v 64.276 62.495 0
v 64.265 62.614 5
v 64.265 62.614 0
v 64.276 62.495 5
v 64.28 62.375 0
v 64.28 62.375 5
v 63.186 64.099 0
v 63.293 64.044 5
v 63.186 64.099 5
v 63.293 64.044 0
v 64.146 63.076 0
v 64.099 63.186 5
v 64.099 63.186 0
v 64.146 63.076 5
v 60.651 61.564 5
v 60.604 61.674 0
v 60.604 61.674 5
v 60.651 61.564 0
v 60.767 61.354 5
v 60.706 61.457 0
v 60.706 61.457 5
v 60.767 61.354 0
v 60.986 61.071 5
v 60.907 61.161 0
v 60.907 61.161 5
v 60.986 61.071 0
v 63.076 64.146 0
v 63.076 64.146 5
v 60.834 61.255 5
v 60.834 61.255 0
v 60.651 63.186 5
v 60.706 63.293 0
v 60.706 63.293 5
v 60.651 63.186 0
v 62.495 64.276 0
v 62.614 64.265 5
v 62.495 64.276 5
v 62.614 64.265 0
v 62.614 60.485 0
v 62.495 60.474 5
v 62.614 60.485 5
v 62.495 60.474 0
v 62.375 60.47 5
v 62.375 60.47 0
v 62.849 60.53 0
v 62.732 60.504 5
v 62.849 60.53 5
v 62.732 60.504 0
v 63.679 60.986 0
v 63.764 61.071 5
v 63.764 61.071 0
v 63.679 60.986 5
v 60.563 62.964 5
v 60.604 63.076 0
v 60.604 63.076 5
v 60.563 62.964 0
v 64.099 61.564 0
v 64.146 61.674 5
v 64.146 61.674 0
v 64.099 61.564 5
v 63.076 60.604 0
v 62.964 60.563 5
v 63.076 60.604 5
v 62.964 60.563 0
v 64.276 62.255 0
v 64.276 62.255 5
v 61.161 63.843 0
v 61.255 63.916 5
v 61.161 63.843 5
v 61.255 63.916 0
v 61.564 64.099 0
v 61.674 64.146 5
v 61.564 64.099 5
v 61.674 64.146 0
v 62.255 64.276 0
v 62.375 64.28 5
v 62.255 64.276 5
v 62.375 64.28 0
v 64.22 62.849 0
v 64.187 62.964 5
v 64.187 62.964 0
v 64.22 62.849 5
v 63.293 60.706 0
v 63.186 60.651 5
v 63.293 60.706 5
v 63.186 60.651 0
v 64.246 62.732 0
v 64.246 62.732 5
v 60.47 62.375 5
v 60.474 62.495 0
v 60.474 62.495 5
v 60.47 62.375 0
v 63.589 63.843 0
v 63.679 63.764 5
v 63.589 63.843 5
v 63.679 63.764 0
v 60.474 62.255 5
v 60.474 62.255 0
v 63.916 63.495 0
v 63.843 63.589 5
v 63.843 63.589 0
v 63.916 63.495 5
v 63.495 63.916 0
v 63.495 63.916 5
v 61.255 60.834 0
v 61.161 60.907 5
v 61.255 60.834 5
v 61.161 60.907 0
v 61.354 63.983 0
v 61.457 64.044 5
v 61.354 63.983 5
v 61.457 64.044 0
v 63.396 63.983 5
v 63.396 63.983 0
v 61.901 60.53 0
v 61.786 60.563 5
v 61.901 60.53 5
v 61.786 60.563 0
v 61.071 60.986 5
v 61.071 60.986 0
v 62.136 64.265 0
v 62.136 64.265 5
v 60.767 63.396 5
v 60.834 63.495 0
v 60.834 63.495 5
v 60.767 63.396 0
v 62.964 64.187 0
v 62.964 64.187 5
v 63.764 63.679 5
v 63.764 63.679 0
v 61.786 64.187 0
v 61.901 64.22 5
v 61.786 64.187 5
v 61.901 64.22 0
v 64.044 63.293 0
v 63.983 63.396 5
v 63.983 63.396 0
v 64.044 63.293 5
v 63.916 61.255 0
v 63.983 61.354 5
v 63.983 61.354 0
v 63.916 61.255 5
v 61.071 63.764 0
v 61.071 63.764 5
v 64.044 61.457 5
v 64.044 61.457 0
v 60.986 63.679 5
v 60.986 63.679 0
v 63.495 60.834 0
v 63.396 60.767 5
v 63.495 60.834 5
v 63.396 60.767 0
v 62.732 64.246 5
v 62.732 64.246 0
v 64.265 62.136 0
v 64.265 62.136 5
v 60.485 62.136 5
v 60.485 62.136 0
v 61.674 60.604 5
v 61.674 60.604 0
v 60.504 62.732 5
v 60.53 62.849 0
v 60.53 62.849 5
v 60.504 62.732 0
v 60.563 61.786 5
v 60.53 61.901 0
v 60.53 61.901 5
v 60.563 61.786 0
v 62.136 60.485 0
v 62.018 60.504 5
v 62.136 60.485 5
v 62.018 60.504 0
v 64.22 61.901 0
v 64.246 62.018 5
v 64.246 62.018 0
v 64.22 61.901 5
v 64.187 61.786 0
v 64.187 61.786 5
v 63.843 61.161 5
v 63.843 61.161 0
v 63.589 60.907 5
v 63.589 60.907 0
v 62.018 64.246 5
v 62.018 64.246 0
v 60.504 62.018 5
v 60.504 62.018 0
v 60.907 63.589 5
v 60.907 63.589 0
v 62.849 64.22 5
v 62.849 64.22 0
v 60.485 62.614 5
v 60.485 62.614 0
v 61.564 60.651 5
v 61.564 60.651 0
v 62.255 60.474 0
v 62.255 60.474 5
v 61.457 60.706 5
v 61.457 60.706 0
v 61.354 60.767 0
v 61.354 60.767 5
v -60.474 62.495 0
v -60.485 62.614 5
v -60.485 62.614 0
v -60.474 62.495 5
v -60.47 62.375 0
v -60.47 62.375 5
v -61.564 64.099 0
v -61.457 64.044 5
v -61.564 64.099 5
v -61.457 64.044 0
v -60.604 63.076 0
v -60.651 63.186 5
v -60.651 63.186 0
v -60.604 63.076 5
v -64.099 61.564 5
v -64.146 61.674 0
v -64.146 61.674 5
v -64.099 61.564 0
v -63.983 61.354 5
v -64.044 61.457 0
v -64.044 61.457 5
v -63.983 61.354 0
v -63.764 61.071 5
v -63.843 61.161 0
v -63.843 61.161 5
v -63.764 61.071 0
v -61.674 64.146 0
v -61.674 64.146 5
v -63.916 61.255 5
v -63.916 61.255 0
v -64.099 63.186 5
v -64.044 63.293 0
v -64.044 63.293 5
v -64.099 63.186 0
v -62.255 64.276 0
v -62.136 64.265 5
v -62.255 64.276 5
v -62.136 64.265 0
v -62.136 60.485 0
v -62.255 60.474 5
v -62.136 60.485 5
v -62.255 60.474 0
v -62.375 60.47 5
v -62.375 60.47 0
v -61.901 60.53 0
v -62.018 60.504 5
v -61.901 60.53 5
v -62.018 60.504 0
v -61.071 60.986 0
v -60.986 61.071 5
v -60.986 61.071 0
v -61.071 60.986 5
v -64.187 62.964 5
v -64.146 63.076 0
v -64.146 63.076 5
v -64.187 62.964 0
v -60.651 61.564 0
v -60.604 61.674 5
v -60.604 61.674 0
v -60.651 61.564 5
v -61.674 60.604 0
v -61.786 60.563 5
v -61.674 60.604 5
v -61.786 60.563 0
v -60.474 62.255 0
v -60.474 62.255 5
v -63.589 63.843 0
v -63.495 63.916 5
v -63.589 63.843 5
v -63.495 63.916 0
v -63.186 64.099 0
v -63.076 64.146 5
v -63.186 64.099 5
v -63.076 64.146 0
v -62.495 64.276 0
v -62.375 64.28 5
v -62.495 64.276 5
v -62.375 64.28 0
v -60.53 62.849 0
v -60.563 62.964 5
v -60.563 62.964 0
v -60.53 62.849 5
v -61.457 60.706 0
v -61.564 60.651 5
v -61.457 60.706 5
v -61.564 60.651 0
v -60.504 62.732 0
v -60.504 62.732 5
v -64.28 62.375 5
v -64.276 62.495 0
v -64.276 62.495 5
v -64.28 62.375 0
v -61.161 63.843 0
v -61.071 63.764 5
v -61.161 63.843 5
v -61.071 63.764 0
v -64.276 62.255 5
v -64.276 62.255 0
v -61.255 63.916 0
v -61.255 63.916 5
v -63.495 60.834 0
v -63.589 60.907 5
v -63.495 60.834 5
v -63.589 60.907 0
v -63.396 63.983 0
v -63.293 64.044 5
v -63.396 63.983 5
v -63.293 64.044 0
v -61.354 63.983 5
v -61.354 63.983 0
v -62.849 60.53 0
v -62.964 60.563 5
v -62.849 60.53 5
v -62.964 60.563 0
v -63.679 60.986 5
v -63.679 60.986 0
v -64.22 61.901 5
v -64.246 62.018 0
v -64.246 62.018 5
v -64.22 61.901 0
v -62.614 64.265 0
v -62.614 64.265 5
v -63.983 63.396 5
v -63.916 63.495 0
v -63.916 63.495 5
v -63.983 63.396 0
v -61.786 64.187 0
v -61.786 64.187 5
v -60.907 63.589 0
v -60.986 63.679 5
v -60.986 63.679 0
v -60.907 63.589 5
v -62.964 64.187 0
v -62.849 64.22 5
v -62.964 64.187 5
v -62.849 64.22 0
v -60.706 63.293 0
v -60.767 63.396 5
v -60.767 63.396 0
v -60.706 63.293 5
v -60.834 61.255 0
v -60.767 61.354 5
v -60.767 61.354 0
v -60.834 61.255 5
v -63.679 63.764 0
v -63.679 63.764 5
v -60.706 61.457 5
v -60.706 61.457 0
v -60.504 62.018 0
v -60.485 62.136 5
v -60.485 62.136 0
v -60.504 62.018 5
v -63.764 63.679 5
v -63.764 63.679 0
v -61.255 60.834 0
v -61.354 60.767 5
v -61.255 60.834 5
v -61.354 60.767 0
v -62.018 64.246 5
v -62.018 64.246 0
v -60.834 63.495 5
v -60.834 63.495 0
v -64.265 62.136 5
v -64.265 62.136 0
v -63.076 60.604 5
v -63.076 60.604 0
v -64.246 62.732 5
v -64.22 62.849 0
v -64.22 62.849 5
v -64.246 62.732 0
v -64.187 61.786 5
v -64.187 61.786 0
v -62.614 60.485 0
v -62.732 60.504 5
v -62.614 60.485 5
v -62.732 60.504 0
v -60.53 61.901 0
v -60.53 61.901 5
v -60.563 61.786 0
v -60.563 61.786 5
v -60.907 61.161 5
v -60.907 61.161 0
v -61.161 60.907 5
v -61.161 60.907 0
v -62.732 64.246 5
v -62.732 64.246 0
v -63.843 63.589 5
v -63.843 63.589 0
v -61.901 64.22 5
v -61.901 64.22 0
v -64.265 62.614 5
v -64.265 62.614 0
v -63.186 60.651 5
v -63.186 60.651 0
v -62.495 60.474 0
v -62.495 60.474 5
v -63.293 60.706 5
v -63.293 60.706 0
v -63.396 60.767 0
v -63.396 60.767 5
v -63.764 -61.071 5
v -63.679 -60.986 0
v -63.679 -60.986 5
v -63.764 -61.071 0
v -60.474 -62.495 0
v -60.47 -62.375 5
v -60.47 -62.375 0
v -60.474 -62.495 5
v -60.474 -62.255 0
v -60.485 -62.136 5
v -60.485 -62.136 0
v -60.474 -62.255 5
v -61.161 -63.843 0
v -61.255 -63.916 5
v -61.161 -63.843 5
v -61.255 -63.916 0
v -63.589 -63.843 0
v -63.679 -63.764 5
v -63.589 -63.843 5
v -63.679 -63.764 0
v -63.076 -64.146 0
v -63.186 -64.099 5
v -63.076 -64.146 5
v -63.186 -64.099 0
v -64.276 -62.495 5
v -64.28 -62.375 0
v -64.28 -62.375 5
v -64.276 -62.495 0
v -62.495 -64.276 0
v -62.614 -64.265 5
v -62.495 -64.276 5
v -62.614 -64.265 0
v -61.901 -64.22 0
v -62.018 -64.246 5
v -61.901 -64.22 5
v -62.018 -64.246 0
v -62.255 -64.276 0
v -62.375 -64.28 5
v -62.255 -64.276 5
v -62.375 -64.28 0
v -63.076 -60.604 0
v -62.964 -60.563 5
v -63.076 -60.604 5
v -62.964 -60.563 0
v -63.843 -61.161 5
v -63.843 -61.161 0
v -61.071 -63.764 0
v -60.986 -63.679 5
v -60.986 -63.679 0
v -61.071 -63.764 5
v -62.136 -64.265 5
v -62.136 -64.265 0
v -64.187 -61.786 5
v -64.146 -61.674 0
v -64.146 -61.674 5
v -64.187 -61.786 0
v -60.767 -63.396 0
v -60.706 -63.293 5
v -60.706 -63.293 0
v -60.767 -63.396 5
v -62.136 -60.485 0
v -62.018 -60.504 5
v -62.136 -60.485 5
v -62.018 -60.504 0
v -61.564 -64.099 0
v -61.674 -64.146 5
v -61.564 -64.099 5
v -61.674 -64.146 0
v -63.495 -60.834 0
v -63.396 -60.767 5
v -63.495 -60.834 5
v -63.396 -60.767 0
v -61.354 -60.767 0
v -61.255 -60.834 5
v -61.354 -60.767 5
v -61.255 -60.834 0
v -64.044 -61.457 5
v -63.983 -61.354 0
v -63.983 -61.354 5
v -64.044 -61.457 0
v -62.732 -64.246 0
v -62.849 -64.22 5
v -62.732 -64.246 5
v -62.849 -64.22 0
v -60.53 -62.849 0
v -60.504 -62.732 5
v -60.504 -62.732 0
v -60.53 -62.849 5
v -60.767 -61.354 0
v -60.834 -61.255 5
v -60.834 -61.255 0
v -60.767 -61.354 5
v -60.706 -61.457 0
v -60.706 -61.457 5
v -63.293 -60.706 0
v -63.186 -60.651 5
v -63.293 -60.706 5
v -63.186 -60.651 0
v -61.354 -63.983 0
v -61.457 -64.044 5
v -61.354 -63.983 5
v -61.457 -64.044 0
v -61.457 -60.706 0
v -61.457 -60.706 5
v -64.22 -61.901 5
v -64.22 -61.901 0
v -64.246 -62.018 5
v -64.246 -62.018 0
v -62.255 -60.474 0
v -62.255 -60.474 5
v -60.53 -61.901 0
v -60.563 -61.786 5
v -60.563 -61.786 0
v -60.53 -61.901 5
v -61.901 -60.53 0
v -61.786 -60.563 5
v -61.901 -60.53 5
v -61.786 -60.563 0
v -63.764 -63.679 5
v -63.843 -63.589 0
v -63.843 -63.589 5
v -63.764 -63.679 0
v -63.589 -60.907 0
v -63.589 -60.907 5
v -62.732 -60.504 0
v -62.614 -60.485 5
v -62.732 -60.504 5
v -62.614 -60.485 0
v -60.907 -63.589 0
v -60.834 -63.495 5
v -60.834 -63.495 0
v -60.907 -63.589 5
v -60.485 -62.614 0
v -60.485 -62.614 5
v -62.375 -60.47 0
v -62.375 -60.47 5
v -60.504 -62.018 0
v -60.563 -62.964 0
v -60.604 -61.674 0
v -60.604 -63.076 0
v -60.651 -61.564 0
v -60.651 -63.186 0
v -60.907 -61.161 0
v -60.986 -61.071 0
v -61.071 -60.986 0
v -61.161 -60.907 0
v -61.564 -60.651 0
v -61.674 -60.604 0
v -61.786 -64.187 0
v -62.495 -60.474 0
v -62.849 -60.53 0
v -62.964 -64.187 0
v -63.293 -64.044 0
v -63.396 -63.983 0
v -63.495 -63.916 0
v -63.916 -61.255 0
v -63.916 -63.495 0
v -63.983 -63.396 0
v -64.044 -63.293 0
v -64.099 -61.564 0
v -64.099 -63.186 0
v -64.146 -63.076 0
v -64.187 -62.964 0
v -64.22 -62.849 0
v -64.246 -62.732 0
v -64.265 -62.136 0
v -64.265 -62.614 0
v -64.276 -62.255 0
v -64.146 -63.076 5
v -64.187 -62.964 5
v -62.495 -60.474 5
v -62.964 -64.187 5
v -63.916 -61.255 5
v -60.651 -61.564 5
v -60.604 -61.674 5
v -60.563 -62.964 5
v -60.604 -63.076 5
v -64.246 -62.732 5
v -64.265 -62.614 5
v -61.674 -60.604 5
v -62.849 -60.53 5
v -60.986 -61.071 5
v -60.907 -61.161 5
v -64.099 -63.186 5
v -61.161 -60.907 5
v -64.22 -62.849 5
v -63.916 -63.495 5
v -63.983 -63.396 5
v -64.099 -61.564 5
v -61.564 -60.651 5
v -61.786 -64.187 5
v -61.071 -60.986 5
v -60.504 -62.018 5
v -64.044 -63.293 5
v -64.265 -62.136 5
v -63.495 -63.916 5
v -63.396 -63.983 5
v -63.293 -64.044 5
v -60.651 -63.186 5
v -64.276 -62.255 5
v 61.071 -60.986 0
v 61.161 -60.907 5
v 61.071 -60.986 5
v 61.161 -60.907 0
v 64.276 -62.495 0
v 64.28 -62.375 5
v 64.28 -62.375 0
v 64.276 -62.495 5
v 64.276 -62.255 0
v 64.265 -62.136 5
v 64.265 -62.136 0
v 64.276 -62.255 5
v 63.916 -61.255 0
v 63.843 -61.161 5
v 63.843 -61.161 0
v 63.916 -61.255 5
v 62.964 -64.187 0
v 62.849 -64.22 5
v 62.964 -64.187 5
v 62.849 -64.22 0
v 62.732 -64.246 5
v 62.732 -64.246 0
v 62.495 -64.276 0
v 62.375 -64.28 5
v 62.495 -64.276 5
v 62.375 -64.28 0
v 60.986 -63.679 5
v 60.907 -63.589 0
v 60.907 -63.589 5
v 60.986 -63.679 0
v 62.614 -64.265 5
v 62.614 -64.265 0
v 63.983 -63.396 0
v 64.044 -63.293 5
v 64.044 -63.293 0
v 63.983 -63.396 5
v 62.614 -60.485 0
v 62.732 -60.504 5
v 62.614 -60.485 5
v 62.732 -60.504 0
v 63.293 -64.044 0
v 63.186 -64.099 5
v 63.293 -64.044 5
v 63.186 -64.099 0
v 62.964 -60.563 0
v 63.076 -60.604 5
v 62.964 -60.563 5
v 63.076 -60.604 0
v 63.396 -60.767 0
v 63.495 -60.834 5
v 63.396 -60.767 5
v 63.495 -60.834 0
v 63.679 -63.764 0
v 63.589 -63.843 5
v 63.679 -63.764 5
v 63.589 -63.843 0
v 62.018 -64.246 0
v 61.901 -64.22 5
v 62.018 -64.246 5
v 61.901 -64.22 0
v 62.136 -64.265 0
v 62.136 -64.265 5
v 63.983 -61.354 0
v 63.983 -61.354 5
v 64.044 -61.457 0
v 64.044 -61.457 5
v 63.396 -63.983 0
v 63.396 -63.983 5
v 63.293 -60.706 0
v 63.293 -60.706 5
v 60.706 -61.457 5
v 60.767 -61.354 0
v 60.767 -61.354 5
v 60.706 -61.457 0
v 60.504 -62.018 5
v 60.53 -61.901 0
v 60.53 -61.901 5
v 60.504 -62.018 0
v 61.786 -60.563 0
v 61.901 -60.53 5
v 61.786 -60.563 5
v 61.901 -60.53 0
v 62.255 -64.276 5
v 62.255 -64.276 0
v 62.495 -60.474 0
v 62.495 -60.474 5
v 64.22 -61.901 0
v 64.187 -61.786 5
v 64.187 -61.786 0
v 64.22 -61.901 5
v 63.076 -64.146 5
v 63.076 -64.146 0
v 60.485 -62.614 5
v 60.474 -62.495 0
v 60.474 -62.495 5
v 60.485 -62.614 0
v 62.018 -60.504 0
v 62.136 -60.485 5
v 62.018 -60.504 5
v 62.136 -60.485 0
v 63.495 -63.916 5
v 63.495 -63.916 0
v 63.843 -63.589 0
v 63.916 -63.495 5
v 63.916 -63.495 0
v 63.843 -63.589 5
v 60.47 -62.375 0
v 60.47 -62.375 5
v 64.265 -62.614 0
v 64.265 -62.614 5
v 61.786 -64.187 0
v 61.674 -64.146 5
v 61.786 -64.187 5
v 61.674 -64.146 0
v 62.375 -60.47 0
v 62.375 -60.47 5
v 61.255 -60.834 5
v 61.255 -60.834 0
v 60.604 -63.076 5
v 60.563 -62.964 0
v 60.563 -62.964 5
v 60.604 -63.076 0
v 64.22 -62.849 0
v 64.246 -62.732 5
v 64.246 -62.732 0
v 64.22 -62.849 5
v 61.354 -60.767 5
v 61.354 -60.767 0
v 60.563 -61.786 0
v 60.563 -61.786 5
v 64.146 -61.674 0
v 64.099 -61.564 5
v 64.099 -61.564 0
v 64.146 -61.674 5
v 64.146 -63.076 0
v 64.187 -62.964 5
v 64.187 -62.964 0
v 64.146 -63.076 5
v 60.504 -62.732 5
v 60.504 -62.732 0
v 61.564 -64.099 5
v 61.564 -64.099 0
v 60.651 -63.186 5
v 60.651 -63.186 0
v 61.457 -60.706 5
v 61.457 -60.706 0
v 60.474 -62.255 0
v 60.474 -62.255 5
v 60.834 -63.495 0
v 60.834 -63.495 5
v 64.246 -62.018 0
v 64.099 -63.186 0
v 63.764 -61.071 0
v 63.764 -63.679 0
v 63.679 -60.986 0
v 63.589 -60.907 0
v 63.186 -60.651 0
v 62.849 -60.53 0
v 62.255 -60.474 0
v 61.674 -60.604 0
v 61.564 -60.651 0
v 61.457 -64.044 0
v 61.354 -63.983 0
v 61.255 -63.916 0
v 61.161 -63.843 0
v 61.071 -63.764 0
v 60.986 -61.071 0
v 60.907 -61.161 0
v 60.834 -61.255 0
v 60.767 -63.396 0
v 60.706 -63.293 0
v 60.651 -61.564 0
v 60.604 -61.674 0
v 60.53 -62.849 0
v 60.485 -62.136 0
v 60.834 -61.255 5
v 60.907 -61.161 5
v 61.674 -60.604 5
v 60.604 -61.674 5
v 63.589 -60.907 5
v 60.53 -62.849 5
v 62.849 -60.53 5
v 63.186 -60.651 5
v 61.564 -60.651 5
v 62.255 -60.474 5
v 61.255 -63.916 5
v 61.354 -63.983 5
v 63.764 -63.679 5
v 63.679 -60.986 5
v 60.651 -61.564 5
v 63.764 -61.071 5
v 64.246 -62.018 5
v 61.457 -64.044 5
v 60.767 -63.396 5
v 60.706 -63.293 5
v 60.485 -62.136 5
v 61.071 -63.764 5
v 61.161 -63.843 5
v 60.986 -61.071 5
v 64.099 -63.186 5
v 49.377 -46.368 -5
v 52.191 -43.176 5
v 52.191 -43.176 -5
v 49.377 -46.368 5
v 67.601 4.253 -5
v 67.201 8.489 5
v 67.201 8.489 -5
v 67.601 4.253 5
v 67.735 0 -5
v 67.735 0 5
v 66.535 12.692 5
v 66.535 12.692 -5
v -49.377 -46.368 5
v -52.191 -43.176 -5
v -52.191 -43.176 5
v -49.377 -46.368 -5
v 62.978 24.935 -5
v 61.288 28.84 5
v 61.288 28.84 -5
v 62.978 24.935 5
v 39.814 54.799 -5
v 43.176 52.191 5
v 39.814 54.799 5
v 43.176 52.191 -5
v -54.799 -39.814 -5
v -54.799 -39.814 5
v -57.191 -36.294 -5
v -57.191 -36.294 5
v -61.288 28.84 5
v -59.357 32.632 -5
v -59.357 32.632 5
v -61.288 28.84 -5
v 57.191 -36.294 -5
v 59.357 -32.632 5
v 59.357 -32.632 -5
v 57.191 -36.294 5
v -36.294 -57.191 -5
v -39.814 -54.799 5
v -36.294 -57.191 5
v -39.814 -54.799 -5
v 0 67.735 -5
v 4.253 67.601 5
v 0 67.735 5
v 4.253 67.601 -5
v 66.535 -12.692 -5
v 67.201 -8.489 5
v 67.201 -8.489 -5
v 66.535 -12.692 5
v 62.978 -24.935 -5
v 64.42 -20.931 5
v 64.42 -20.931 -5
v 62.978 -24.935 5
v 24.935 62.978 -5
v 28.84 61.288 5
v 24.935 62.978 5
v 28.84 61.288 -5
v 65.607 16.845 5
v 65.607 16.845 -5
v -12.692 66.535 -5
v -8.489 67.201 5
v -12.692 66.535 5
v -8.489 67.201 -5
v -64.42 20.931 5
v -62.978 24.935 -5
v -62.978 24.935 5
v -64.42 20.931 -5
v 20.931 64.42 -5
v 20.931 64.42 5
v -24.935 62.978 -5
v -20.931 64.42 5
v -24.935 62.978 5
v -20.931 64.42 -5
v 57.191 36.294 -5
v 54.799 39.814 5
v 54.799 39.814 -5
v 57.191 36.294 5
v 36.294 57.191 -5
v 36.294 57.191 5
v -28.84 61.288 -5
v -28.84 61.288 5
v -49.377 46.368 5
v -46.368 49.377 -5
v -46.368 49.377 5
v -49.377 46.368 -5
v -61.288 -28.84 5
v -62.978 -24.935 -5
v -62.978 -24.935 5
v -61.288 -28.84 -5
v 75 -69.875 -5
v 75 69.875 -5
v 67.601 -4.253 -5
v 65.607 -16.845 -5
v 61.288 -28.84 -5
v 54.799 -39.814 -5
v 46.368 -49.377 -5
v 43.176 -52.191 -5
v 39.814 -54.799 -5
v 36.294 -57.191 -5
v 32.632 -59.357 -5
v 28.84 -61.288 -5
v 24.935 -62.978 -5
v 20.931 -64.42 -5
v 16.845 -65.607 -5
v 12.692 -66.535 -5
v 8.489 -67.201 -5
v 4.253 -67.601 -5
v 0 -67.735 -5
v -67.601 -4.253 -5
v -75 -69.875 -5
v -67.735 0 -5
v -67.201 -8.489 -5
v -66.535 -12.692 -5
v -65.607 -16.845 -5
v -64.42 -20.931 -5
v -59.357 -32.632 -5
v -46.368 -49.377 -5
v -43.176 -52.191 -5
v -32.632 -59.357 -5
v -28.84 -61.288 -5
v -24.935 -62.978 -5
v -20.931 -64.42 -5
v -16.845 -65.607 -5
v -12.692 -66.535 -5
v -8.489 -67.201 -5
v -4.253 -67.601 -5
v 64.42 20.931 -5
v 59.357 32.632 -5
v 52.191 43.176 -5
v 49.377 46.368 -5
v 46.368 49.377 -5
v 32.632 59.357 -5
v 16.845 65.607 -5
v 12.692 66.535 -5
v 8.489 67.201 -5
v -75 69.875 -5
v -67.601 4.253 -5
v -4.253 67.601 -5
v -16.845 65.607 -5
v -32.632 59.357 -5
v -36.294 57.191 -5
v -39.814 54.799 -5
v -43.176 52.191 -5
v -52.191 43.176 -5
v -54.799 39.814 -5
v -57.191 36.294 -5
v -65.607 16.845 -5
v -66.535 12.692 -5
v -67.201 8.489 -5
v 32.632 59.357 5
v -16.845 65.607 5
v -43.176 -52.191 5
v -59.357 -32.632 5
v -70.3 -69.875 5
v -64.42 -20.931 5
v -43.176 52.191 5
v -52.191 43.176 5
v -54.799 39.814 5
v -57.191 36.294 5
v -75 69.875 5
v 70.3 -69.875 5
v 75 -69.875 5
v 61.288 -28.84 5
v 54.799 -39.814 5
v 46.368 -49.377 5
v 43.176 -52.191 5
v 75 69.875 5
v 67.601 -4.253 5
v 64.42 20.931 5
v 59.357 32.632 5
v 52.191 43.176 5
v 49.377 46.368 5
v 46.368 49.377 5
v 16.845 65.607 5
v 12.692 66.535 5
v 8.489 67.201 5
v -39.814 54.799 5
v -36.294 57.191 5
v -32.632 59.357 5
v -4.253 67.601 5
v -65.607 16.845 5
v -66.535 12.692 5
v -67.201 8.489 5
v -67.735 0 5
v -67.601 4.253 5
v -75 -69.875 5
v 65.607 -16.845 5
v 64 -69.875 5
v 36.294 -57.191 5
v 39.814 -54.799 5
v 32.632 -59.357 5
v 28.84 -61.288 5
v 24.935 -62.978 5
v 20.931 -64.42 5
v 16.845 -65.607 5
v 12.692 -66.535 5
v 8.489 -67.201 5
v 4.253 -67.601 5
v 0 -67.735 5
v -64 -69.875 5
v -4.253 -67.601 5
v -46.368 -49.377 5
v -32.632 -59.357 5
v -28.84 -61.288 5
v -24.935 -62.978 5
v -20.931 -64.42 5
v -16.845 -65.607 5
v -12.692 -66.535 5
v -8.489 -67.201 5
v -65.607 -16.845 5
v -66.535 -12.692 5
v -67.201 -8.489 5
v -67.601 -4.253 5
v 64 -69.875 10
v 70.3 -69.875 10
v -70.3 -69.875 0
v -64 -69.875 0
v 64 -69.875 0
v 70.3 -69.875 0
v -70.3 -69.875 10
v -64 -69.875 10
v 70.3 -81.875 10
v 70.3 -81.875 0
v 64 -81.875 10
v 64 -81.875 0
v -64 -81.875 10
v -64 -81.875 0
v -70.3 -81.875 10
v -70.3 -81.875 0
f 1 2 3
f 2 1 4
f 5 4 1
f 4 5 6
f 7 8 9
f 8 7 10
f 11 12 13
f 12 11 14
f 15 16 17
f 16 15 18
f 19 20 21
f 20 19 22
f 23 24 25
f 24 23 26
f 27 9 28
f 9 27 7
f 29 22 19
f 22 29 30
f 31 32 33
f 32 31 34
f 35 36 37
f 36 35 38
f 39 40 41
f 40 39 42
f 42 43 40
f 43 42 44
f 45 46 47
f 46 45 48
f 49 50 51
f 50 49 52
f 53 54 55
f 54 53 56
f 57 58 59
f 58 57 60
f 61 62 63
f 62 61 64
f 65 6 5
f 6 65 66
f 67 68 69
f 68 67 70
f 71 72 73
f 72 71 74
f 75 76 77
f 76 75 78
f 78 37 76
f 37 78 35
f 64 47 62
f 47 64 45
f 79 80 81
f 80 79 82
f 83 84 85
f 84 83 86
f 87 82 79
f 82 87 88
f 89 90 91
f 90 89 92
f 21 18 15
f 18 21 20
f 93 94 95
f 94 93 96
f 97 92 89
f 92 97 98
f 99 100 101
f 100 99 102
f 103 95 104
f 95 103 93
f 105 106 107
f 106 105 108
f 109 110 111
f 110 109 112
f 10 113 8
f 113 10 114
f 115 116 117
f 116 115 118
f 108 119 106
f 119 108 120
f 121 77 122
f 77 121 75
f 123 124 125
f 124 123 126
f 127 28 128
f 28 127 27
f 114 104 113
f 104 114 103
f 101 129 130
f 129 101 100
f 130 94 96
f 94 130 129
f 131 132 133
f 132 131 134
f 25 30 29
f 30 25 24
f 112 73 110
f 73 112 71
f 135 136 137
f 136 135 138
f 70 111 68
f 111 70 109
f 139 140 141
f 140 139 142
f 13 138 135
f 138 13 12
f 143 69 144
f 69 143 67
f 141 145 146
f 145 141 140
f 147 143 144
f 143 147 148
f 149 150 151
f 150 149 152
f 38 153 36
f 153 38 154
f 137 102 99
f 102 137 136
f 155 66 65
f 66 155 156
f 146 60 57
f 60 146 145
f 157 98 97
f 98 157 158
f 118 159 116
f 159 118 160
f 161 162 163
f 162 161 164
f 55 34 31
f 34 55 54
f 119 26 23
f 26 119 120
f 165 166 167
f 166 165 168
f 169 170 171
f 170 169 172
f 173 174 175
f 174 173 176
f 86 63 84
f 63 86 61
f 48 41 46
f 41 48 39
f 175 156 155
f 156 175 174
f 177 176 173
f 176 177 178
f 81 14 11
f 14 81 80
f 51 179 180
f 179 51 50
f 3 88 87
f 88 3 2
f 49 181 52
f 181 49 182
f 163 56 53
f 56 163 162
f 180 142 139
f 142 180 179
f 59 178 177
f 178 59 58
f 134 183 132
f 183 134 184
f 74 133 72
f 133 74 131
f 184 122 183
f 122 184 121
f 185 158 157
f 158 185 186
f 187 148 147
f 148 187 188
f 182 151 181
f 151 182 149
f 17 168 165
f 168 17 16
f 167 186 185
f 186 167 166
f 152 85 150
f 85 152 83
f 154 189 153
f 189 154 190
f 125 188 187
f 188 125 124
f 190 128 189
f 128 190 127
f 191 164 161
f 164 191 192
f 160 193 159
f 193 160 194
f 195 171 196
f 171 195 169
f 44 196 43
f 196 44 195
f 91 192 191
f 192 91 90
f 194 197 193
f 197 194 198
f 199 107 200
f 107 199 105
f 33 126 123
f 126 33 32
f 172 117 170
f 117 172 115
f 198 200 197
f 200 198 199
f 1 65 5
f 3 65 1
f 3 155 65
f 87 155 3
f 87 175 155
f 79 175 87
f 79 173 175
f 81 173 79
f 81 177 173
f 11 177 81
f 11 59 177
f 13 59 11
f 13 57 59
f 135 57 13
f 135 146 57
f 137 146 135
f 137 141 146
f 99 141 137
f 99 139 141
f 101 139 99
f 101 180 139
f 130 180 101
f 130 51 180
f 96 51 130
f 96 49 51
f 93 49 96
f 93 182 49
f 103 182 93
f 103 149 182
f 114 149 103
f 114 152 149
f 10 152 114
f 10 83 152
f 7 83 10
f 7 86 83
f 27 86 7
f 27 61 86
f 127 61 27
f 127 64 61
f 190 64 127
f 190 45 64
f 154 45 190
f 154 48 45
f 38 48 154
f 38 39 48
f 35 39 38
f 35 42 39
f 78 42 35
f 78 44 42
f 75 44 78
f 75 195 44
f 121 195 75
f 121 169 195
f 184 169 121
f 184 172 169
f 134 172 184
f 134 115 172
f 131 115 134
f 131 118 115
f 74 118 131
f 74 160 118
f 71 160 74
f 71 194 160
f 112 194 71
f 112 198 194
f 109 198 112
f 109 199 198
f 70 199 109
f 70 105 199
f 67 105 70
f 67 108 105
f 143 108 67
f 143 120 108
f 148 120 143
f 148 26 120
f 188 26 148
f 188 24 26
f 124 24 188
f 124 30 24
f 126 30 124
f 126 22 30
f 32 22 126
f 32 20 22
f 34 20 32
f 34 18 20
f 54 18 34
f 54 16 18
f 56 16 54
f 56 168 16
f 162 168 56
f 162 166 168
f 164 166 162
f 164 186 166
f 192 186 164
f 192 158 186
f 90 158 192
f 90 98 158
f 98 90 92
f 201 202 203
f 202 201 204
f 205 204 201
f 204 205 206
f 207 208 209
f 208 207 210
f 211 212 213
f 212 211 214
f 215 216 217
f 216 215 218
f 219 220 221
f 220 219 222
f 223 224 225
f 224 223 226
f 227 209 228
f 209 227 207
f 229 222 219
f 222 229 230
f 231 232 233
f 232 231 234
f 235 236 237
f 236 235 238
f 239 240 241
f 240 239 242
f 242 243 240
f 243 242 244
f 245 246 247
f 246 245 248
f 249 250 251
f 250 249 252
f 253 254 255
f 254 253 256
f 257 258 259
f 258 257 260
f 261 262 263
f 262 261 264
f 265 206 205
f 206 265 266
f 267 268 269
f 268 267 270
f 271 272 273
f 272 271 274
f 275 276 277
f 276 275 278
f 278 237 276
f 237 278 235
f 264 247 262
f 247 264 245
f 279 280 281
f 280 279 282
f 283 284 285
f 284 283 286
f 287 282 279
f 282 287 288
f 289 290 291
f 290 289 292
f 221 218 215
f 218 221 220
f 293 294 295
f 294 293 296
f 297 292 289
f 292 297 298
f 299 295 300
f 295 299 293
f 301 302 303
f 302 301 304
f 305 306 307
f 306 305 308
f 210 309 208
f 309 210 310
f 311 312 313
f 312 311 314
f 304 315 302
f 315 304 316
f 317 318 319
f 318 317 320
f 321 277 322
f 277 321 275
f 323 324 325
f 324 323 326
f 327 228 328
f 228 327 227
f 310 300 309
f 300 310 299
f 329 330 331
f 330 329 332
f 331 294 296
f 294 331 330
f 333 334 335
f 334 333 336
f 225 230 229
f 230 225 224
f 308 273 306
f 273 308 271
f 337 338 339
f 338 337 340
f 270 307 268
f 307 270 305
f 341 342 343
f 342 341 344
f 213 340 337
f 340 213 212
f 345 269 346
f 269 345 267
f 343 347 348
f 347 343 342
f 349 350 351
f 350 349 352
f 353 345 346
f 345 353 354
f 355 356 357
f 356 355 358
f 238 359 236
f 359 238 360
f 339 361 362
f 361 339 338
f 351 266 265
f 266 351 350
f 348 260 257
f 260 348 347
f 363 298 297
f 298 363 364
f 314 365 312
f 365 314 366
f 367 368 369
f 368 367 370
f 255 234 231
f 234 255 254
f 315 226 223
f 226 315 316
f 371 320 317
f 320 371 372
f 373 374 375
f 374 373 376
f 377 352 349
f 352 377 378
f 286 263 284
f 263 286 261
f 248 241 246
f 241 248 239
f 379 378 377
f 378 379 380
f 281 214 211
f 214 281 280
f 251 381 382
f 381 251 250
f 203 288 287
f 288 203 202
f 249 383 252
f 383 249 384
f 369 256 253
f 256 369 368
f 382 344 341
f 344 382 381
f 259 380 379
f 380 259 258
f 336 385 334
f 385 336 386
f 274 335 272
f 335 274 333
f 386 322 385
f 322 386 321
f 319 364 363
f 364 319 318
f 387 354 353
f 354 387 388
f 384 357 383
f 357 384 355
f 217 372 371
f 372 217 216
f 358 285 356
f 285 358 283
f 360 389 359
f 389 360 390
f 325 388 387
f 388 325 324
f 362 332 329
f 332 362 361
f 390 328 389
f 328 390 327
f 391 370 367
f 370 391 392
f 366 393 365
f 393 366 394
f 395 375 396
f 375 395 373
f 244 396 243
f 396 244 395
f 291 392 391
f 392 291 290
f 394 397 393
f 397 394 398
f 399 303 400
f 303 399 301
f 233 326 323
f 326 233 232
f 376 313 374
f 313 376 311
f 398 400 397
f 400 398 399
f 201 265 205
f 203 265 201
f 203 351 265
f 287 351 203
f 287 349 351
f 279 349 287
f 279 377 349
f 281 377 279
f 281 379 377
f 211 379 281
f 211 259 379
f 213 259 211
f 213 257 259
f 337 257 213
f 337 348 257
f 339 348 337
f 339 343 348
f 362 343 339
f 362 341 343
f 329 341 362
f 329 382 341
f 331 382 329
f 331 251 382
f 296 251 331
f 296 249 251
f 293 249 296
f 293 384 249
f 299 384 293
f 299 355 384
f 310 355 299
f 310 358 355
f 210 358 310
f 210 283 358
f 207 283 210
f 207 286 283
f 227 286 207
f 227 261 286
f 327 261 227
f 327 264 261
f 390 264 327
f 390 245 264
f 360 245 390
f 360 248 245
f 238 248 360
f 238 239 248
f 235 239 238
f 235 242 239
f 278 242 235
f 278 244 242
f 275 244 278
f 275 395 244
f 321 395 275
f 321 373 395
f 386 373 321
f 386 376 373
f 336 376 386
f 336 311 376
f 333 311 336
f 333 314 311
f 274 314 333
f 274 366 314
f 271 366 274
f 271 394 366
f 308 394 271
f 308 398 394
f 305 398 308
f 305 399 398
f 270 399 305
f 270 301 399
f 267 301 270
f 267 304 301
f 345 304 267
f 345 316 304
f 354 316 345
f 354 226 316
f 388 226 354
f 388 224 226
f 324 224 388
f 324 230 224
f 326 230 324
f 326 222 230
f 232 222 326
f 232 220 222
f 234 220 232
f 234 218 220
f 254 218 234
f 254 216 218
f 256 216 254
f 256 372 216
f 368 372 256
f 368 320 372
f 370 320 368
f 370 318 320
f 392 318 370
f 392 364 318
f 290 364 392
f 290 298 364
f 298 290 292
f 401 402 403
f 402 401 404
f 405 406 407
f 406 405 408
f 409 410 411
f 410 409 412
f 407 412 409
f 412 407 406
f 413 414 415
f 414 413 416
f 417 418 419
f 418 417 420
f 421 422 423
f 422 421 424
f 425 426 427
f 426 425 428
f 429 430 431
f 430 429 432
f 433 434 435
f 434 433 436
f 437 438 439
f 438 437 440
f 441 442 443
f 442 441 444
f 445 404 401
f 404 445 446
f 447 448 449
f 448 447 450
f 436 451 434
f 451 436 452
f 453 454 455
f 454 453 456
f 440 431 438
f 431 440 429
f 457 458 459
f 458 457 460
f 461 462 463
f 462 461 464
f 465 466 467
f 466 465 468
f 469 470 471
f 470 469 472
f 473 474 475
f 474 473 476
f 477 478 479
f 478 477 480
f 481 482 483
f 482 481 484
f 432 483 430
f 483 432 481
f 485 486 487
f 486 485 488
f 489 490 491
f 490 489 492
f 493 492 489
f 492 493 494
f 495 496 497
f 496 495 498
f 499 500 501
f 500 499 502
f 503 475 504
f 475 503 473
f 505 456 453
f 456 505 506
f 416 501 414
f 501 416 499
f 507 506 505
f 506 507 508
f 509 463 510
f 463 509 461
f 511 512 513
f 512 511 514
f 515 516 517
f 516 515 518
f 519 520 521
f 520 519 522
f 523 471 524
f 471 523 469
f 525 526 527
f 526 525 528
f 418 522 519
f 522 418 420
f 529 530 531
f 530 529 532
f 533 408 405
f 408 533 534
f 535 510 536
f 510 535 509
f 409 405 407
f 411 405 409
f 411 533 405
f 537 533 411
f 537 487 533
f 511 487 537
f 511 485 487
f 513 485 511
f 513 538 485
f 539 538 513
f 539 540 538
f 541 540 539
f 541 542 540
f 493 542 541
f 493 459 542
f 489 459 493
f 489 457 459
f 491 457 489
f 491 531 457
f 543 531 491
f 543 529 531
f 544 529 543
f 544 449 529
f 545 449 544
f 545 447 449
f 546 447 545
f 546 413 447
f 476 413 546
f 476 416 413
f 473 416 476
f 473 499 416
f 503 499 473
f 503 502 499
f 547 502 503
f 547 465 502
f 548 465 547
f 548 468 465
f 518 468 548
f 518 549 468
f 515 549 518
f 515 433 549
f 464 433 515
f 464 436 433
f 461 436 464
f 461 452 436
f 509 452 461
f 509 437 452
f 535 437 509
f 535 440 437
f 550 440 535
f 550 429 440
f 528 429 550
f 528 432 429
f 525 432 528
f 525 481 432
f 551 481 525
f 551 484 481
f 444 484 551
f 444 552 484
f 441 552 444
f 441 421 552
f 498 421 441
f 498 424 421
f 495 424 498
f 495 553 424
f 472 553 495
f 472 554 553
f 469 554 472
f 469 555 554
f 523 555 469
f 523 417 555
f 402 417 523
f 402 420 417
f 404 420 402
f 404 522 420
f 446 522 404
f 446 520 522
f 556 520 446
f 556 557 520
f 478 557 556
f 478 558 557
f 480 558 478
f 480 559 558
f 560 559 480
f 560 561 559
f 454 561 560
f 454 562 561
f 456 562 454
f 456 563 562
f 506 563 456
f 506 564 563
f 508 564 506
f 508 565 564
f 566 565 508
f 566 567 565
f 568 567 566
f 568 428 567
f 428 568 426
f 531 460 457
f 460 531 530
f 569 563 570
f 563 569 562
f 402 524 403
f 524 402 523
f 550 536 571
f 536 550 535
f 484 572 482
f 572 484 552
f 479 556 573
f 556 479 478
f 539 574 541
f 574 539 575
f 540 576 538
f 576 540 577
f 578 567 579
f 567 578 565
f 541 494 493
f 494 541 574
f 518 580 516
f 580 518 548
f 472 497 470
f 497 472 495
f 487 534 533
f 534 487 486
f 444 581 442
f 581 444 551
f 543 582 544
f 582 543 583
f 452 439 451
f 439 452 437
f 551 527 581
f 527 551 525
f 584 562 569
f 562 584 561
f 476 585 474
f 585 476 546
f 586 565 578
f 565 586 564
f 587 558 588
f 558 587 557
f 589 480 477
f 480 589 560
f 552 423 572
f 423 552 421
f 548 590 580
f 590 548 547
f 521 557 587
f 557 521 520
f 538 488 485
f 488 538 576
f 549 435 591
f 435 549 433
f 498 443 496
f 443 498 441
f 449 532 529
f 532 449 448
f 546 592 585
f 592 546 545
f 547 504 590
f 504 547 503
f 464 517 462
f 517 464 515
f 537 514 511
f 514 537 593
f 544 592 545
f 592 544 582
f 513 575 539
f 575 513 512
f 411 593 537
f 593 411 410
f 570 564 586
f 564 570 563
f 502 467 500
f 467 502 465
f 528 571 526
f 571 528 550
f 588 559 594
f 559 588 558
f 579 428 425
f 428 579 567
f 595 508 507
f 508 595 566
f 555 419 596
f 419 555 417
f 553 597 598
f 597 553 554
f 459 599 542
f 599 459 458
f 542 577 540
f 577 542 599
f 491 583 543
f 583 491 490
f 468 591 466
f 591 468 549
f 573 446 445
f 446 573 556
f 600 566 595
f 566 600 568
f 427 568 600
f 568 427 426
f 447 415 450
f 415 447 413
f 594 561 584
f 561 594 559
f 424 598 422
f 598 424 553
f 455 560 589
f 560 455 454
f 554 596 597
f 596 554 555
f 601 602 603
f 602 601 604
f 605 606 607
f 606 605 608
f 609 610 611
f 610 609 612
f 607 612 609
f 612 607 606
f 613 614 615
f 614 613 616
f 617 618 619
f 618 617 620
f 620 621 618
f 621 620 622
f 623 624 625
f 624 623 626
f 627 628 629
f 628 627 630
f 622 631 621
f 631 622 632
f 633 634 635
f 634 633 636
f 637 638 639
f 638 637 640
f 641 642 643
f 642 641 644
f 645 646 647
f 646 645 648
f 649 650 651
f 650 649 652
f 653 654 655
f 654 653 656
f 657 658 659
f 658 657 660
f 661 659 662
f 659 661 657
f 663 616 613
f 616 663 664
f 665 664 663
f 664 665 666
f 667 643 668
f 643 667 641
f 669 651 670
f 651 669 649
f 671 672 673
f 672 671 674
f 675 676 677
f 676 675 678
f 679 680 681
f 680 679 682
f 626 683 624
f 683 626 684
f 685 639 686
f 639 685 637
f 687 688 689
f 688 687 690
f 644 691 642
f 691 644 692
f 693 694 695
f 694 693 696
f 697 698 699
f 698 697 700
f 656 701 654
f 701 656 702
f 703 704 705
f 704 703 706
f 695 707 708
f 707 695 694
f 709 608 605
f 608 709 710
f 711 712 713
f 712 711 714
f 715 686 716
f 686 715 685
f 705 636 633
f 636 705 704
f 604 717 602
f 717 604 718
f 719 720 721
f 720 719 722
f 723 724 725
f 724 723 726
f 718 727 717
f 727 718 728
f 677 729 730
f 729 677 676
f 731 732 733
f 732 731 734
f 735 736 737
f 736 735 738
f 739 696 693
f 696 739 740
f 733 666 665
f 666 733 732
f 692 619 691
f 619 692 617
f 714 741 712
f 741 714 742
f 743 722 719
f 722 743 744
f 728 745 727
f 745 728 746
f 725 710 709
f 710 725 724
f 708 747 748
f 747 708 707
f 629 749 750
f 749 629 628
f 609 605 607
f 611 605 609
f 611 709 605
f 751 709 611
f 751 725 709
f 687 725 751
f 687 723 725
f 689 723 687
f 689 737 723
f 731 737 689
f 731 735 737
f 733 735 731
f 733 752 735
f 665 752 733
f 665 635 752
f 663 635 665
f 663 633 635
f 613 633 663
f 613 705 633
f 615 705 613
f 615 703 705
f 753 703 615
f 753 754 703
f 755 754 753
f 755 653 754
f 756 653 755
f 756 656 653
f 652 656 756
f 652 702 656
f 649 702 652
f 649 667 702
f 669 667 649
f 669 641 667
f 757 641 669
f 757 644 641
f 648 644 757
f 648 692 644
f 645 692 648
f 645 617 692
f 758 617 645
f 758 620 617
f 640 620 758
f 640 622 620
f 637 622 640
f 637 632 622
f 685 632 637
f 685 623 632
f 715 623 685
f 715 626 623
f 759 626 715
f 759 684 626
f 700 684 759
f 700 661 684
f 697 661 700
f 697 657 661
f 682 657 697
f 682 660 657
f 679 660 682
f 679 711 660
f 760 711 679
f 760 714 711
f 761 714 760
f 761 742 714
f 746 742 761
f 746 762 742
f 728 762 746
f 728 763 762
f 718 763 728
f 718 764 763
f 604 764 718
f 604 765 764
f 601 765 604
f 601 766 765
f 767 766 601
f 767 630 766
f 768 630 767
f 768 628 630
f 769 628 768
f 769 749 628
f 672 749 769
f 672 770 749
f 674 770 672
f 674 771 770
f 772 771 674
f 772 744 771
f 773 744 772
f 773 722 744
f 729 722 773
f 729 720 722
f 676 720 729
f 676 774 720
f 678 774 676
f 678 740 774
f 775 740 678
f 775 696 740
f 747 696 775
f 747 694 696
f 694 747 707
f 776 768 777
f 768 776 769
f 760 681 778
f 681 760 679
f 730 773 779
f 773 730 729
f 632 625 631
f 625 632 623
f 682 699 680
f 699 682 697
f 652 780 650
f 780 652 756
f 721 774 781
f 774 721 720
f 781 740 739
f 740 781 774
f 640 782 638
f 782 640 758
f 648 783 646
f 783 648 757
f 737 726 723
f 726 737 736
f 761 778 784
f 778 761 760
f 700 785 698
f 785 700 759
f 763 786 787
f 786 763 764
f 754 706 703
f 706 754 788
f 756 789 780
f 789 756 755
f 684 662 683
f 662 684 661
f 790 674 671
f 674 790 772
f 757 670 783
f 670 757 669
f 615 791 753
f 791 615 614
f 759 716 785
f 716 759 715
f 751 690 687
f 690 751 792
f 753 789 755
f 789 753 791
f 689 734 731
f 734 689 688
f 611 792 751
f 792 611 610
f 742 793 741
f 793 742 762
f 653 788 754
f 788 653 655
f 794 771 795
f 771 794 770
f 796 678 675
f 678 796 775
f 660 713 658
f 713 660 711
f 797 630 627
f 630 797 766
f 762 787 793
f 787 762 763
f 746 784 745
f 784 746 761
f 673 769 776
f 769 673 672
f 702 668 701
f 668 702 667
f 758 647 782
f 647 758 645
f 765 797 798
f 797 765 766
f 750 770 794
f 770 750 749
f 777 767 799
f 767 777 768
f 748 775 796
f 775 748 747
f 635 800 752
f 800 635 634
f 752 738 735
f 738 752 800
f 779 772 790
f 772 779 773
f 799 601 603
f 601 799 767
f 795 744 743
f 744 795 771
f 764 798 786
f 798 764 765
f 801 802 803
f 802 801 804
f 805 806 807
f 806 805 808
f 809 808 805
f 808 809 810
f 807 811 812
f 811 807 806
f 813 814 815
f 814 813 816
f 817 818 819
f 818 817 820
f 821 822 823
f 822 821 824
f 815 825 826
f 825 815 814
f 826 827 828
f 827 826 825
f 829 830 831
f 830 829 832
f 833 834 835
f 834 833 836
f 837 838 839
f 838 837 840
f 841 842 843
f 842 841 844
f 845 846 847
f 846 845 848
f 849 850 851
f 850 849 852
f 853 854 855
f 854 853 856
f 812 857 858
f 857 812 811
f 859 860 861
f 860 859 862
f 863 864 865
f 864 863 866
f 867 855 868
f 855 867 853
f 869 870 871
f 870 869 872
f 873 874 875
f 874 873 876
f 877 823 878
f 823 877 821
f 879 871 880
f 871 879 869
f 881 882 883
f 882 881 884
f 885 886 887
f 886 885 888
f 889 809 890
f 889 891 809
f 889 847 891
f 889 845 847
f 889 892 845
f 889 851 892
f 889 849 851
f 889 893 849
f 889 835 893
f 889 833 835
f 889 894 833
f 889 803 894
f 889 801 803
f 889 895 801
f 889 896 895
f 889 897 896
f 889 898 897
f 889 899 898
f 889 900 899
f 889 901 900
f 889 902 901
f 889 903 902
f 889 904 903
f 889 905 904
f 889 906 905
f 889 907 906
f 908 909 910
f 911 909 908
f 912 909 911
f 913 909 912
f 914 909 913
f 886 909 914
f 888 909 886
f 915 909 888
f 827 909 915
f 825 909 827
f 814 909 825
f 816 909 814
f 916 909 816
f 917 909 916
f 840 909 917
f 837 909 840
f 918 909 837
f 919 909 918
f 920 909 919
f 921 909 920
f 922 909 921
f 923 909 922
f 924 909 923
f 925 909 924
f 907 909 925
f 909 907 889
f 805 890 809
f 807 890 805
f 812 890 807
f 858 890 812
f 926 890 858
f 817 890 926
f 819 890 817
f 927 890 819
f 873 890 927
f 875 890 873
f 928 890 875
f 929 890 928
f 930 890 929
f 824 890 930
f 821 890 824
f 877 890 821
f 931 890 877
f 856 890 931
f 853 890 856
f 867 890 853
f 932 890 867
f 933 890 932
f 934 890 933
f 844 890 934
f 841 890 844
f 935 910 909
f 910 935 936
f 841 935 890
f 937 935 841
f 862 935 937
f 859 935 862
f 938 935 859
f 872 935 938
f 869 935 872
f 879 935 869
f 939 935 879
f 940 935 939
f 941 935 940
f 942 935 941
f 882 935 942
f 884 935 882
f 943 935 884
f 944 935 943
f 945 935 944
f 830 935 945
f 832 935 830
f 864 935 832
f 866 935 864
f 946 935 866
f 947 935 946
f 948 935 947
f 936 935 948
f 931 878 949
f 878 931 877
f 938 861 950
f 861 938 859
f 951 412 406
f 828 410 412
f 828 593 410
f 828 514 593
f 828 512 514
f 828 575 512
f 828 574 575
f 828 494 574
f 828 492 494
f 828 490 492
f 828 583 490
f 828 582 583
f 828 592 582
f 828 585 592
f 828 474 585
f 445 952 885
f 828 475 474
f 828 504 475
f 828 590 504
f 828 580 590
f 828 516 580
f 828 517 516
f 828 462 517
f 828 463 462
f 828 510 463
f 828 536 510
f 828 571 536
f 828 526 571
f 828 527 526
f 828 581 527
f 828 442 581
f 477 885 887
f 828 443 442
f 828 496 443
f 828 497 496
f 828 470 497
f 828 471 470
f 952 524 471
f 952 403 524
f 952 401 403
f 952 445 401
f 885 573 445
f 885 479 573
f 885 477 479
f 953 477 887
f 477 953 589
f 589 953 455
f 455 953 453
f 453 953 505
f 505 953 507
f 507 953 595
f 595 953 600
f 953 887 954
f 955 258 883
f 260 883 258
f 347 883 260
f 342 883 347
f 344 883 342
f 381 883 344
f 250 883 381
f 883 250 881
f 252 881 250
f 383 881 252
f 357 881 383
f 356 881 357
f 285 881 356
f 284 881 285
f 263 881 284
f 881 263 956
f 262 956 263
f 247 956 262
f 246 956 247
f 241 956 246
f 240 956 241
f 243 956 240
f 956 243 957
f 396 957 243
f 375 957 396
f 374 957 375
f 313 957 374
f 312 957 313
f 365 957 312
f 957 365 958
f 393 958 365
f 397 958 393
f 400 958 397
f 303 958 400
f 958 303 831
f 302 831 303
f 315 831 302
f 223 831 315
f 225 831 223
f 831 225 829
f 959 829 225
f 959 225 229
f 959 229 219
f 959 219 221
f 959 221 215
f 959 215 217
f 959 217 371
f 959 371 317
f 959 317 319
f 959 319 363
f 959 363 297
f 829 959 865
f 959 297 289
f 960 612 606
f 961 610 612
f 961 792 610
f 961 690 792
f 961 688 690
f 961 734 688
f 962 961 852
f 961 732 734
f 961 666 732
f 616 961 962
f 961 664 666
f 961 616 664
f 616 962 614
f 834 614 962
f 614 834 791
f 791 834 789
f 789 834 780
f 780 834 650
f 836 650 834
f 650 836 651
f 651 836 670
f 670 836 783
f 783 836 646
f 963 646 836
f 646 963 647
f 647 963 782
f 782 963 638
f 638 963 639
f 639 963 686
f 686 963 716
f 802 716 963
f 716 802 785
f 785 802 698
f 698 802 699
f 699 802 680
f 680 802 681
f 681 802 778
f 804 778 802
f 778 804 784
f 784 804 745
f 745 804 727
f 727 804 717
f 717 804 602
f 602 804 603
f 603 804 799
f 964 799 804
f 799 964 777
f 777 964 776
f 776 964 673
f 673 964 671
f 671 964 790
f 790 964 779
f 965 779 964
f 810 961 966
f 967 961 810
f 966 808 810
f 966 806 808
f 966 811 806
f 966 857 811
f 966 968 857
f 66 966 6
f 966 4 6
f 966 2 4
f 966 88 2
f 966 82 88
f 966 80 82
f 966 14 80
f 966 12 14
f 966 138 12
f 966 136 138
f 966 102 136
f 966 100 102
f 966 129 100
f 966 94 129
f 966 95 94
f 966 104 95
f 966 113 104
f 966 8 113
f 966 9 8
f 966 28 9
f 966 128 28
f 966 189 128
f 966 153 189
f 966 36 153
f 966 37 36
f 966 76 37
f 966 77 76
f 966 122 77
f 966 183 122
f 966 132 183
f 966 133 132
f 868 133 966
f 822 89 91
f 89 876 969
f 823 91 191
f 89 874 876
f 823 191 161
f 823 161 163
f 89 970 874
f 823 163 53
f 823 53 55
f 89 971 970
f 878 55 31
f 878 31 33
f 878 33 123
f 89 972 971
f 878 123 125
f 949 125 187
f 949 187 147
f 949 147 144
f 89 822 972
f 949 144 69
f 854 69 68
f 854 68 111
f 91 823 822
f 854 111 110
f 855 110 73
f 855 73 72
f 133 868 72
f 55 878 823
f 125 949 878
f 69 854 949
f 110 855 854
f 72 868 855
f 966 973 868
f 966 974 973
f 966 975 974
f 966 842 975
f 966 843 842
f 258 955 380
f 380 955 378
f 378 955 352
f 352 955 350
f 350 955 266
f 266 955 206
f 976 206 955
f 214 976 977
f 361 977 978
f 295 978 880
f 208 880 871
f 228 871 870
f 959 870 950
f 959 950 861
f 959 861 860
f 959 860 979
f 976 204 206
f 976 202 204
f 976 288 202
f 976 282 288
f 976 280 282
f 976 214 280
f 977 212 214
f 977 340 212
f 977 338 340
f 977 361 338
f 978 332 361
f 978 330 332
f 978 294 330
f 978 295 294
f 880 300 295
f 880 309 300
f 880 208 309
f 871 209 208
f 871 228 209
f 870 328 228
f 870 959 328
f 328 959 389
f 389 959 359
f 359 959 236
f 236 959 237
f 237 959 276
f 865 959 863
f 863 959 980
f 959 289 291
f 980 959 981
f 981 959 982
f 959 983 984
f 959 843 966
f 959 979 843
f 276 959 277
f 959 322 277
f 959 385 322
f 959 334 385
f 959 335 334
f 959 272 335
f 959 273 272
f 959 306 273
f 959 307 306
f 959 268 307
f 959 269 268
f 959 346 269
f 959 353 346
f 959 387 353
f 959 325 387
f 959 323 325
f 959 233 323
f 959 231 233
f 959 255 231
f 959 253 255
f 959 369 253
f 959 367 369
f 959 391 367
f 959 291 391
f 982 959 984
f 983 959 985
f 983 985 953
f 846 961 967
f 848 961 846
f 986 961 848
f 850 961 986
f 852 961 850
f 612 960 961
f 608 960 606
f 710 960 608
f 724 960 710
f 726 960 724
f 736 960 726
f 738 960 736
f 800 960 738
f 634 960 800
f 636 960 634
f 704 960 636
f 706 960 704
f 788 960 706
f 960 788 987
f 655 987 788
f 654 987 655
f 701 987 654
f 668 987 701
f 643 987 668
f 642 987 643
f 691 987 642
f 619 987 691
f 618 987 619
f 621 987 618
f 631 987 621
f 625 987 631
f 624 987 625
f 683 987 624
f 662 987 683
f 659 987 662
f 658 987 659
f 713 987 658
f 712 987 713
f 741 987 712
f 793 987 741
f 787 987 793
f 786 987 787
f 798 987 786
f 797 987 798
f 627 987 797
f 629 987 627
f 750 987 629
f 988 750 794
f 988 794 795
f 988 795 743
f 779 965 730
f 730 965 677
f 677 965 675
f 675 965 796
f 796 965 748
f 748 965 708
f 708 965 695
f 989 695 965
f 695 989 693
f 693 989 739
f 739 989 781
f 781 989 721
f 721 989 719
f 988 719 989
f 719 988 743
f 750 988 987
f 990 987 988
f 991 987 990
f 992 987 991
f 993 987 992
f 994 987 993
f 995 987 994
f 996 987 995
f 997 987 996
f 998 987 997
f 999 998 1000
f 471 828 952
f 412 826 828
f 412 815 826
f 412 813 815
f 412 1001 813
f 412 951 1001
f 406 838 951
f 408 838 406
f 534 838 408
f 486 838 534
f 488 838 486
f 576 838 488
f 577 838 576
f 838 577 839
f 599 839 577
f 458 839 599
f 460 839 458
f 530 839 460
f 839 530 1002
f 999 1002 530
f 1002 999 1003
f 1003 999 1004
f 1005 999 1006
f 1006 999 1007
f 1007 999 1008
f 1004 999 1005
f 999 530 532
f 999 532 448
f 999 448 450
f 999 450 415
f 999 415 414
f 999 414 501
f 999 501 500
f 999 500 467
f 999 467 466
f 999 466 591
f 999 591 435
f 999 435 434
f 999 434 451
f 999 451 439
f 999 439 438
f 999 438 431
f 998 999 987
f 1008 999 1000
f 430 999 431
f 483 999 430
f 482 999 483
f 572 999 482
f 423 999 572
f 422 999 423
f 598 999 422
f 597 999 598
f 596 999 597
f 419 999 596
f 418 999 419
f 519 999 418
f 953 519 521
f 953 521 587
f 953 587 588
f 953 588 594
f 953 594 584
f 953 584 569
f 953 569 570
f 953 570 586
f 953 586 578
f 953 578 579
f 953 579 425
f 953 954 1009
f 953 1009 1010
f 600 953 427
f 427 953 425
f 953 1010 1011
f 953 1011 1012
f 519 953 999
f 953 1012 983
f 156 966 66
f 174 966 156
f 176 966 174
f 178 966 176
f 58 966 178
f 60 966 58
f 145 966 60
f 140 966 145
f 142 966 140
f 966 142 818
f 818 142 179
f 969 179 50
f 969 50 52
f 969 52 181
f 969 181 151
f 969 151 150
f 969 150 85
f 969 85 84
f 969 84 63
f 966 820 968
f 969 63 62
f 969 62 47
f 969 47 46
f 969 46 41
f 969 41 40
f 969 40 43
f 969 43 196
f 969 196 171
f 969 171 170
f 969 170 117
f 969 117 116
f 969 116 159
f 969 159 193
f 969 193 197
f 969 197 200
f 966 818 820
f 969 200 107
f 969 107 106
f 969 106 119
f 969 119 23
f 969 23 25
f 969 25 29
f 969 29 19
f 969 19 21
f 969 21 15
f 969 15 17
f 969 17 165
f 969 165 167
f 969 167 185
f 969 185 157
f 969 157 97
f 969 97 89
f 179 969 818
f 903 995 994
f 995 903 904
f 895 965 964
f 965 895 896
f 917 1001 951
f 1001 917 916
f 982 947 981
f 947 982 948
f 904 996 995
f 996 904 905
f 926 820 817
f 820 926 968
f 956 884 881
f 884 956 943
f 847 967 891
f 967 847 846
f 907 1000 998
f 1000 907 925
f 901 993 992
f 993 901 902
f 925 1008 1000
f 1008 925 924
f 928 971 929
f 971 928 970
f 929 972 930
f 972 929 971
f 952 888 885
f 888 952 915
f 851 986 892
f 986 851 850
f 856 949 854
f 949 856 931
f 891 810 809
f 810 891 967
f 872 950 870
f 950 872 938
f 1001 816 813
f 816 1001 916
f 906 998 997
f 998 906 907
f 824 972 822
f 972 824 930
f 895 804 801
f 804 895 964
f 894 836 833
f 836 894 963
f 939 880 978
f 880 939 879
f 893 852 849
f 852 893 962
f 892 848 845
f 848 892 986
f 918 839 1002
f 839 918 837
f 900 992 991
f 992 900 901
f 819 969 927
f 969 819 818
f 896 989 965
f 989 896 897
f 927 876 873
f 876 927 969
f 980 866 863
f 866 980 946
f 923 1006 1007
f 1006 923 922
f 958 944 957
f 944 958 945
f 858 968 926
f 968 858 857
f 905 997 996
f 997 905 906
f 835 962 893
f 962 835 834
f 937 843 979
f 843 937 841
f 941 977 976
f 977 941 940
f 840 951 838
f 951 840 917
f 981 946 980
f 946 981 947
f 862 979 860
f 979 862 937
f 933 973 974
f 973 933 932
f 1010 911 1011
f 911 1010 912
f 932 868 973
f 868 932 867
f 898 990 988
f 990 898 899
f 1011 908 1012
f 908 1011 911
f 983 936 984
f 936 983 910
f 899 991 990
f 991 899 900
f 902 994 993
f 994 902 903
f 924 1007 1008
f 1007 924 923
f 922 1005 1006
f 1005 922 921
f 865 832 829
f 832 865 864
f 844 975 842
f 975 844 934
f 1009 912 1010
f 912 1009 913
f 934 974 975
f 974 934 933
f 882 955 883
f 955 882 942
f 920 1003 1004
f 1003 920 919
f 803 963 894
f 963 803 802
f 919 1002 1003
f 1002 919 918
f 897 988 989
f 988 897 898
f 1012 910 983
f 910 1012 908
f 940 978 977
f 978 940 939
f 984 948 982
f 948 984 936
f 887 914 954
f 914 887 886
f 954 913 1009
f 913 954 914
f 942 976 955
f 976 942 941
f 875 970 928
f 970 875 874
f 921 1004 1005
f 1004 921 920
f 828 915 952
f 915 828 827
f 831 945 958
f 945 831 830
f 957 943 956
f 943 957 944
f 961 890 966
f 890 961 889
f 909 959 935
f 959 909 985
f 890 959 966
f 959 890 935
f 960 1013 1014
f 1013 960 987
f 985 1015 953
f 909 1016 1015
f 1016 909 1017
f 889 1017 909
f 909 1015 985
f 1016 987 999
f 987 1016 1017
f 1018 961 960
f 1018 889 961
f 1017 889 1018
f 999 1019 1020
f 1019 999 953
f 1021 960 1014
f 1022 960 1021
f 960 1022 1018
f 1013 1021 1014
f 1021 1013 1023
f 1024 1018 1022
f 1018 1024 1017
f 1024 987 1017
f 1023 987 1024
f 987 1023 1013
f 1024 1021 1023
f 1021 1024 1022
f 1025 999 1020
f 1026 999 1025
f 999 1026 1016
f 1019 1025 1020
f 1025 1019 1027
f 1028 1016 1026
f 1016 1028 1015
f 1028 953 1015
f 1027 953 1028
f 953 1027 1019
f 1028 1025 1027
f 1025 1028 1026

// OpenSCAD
fan_outside = 139.75;
fan_wall =    2.14;       // radius to straight wall
$fn=100;
 
fan_inside_diameter=fan_outside - fan_wall * 2;
fan_inside_radius = fan_inside_diameter/2;

fan_thickness = 25.21;
fan_hole2hole = 124.75;
fan_screw_crest_diameter = 4.95;
fan_screw_root_diameter = 3.81;
fan_corner_radius = 6.34;

fudge = .0;
display_outside = 150.0;
box_outside = 146.9;
box_inside = 140.6;
box_thickness = box_outside - box_inside;
box_height =   10; //45.23;

// make 4 "posts" about 0,0,0 offset by +/-x +/-y 
module posts(x,y,z,h,r)
{
    translate([x,y,z]){         // move post to this location
        cylinder(r = r, h = h); // make one post
    }
    translate([-x,y,z]){        // move post to this location
        cylinder(r = r, h = h); // make one post
    }   
    translate([-x,-y,z]){       // move post to this location
        cylinder(r = r, h = h); // make one post
    }
    translate([x,-y,z]){        // move post to this location
        cylinder(r = r, h = h); // make one post
    }    
}


difference()
{
    //translate([-display_outside/2, -fan_outside/2 , 0])
    cube([display_outside, fan_outside, box_height ], center=true);

    difference() 
    {
       
        // punch out the fan pipe and screws
        union ()
        {
        //translate([0, 0, -10])
        cylinder( h=box_height, r= fan_inside_radius, center=true);
        
        // punch out the screw holes
         posts(  
            x=fan_hole2hole/2,
            y=fan_hole2hole/2,
            z= 0,
            h= box_height+2, //fan_thickness+1,
            r = fan_screw_root_diameter/2);
            

        }
    }
}

track_depth = 12;
track_width = box_thickness;   
//track_width = box_thickness;

echo (fan_outside)
echo (box_inside)
echo(display_outside)
translate([box_inside/2 -track_width , -fan_outside/2 - track_depth  ,  0])   
#cube([ track_width, track_depth, box_height], center=false);   

translate([-box_inside/2 , -fan_outside/2 - track_depth ,  0])   
#cube([ track_width, track_depth, box_height], center=false);   
